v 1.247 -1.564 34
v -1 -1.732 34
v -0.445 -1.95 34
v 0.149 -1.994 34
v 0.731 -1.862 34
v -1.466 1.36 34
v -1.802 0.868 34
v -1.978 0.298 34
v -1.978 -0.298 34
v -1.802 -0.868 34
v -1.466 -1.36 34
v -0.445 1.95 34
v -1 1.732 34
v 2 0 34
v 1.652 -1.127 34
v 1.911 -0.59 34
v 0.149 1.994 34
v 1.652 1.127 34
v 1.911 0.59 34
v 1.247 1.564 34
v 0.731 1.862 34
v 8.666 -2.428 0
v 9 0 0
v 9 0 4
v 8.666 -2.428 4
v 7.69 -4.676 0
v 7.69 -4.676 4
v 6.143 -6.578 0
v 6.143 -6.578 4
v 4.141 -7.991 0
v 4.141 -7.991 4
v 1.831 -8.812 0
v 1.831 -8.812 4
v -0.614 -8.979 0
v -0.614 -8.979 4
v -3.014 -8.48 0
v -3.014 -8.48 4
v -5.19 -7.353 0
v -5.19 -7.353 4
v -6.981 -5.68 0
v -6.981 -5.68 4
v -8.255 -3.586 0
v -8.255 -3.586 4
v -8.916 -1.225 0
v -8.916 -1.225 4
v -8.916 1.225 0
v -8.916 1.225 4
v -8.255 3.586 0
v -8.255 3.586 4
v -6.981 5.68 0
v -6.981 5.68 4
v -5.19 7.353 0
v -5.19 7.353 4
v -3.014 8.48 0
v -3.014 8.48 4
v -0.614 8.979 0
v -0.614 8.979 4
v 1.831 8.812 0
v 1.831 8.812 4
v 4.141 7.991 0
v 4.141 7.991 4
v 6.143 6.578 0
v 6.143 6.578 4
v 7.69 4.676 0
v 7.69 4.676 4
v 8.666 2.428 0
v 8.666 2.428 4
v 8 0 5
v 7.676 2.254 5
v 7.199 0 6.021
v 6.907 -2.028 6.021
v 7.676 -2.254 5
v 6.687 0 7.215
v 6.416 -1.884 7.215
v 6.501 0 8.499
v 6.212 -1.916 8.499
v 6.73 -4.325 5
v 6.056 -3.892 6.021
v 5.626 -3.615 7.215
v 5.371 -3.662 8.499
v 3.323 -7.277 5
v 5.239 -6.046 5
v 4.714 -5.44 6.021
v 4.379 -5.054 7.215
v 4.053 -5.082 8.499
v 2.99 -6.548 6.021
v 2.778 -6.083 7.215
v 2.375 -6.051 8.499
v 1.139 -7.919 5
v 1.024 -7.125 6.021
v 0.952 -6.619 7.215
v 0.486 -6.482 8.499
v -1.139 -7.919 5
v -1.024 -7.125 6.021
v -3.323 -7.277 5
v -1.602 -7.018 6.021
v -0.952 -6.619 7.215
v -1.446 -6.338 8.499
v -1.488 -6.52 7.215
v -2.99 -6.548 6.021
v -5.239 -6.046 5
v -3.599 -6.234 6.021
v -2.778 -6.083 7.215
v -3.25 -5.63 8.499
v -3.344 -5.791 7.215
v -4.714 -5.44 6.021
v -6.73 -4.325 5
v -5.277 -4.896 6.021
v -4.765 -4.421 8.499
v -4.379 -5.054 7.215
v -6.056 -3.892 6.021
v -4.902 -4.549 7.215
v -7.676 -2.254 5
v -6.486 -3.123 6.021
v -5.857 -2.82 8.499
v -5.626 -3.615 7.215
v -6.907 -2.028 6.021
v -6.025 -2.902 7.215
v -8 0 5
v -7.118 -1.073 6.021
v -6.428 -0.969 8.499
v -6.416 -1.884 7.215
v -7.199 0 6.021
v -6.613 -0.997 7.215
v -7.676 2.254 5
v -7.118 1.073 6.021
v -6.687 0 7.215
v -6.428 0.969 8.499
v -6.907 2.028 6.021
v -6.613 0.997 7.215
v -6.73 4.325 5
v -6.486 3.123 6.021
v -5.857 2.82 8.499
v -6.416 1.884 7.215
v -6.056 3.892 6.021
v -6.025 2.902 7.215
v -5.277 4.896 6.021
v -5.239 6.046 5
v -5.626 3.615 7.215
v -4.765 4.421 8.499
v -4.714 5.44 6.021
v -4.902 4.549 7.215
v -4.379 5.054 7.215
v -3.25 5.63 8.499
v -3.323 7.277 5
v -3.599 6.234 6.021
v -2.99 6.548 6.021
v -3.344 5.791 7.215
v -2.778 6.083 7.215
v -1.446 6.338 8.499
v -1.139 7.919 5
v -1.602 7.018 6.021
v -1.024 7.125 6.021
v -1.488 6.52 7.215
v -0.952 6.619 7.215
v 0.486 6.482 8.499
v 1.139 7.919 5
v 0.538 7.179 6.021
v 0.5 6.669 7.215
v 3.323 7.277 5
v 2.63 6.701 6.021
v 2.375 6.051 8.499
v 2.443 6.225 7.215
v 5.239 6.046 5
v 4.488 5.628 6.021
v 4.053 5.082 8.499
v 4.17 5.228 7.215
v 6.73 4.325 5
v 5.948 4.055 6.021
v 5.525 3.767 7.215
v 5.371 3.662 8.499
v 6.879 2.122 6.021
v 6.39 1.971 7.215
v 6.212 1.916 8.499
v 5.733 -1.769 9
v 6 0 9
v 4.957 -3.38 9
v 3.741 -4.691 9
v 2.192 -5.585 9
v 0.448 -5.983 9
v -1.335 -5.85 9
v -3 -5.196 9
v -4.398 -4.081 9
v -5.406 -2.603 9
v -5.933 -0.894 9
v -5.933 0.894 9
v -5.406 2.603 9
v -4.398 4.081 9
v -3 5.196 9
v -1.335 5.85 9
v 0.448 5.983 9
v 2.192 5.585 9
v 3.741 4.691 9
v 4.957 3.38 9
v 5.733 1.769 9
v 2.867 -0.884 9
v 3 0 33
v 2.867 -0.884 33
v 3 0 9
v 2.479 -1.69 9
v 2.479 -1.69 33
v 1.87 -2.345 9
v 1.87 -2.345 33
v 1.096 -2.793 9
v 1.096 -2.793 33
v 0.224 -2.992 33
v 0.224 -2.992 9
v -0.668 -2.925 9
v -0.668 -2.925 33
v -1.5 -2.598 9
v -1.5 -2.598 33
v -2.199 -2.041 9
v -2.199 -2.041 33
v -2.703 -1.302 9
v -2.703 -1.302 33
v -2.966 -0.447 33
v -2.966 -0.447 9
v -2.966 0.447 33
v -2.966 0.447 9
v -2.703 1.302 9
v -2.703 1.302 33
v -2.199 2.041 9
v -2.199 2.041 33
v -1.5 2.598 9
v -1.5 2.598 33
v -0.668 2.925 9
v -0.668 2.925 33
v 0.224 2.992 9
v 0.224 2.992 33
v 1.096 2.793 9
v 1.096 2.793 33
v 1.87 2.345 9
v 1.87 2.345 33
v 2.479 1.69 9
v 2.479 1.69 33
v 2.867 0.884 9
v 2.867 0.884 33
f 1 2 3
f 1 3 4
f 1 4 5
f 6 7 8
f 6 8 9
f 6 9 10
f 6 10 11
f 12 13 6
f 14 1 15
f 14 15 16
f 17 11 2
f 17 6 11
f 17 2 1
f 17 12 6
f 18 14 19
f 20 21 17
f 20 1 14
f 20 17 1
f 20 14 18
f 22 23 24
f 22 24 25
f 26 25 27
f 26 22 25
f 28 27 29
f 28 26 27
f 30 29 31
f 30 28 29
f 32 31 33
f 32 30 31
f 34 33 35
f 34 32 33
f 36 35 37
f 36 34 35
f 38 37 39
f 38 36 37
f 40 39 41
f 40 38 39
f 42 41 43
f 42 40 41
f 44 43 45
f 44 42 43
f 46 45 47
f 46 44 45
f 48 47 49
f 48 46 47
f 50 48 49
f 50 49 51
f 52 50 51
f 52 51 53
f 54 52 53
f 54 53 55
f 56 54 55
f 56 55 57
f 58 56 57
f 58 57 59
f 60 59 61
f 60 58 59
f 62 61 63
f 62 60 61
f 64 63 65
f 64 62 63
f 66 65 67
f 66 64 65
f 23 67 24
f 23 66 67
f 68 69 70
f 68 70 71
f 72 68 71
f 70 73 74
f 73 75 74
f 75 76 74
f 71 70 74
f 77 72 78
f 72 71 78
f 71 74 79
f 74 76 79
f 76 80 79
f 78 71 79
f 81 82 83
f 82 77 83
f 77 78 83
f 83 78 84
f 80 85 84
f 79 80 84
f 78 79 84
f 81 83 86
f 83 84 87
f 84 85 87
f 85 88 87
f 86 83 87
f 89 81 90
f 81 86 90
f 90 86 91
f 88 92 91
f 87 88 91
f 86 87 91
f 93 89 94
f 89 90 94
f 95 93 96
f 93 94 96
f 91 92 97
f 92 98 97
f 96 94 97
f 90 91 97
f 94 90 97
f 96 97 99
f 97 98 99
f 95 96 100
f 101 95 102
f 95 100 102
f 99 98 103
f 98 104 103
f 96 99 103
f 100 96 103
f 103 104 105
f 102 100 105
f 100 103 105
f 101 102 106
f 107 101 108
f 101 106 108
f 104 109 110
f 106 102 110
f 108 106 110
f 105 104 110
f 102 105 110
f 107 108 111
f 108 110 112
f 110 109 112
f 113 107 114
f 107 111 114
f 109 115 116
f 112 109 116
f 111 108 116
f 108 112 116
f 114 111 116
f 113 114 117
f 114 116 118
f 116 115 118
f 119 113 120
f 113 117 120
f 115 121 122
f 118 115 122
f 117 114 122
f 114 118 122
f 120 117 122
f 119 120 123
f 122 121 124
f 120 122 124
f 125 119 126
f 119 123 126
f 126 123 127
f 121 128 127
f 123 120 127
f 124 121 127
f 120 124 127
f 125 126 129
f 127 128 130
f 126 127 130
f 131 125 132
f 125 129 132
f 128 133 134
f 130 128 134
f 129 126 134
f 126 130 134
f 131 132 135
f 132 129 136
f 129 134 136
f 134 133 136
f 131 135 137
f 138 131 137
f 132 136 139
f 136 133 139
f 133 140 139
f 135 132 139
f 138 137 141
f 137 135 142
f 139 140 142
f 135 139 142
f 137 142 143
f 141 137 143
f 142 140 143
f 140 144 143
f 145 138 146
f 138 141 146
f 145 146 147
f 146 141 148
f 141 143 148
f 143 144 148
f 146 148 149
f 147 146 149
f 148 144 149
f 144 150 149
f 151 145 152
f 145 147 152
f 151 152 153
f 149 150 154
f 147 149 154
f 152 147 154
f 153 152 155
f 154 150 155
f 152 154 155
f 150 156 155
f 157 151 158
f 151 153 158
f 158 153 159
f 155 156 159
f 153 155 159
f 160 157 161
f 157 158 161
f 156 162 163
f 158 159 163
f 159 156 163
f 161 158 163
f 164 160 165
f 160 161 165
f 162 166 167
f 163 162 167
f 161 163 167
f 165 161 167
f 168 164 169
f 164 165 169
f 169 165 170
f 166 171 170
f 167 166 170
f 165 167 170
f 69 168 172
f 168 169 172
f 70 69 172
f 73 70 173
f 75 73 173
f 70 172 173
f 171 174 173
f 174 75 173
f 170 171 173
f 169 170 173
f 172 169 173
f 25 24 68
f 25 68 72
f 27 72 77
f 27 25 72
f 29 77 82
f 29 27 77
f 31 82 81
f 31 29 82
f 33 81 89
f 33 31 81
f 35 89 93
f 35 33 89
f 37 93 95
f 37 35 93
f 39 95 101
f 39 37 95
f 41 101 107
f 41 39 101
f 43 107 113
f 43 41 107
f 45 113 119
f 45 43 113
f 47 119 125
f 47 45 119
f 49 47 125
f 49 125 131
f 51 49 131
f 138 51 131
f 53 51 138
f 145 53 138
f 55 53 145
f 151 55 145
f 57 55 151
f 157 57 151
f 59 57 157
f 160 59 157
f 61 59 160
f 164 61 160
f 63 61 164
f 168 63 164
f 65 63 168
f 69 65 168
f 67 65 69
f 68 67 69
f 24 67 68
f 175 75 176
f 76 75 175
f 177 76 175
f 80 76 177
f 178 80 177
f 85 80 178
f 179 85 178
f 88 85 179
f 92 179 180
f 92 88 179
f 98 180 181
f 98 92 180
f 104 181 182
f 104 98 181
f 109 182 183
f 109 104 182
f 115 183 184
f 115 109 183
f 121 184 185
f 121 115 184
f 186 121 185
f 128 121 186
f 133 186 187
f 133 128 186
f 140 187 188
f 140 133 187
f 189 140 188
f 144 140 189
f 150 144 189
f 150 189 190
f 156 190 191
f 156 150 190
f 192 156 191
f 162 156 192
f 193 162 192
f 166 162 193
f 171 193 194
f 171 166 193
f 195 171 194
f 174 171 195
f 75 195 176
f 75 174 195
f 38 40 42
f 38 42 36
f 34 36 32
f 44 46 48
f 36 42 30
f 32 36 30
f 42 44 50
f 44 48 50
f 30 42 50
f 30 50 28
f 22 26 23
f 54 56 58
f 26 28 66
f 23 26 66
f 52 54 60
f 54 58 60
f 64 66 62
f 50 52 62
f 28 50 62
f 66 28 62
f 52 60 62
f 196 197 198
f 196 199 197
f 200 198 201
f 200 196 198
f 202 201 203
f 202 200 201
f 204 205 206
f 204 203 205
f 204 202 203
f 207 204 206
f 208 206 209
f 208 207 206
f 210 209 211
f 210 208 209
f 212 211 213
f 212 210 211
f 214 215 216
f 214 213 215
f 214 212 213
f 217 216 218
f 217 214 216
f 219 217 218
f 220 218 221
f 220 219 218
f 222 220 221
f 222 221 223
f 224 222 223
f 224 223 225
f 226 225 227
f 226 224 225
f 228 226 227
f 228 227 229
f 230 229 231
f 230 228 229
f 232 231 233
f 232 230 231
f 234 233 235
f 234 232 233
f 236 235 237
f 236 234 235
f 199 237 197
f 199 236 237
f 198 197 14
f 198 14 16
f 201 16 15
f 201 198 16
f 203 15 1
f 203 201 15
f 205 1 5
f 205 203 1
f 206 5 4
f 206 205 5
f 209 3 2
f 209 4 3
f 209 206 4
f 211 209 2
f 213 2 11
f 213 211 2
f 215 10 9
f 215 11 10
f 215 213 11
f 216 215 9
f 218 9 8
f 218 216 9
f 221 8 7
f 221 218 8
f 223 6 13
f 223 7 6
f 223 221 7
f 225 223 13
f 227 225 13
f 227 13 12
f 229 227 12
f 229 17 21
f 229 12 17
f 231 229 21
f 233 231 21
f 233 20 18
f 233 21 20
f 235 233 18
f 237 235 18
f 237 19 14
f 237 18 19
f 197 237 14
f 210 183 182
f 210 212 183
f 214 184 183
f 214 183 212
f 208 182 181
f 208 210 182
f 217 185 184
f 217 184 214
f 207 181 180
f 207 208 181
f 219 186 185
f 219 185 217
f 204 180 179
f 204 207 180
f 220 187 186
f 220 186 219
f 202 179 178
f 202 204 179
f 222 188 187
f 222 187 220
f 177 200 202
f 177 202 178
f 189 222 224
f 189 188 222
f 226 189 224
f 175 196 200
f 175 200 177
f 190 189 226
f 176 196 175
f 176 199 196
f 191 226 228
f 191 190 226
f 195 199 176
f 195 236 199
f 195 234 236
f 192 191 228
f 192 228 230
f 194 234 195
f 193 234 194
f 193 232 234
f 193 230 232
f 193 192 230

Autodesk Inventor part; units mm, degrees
ref_plane "YZ Plane" through (0, 0, 0) normal (1, 0, 0) x (0, 1, 0)
ref_plane "XZ Plane" through (0, 0, 0) normal (0, 1, 0) x (-1, 0, 0)
ref_plane "XY Plane" through (0, 0, 0) normal (0, 0, 1) x (1, 0, 0)
sketch "Esboço2" plane through (0, 0, 0) normal (0, 0, 1) x (1, 0, 0)
  circle A0 centre (0, 0) radius 9
  dimension "d10" = 18
extrude "Extrusão1" add sketch "Esboço2" along normal blind 5
sketch "Esboço3" plane through (0, 0, 5) normal (0, 0, 1) x (1, 0, 0)
  circle A0 centre (0, 0) radius 6.5
  dimension "d13" = 13
extrude "Extrusão2" add sketch "Esboço3" along normal blind 4
sketch "Esboço4" plane through (0, 0, 9) normal (0, 0, 1) x (1, 0, 0)
  circle A0 centre (0, 0) radius 3
  dimension "d17" = 6
extrude "Extrusão3" add sketch "Esboço4" along normal blind 25
chamfer "Chanfro2" distance 1 angle 45 1 edges at (-3, 0, 34)
chamfer "Chanfro3" distance 0.5 angle 45 1 edges at (-6.5, 0, 9)
thread "Rosca1" size "M6x1" class "6g" standard "ISO Metric profile" length 25 offset 3
chamfer "Chanfro5" distance 1 angle 45 1 edges at (-9, 0, 5)
fillet "Arredondamento1" radius 5 1 edges at (-6.5, 0, 5)
properties part number "maniplo" material "Aço, carbono"
